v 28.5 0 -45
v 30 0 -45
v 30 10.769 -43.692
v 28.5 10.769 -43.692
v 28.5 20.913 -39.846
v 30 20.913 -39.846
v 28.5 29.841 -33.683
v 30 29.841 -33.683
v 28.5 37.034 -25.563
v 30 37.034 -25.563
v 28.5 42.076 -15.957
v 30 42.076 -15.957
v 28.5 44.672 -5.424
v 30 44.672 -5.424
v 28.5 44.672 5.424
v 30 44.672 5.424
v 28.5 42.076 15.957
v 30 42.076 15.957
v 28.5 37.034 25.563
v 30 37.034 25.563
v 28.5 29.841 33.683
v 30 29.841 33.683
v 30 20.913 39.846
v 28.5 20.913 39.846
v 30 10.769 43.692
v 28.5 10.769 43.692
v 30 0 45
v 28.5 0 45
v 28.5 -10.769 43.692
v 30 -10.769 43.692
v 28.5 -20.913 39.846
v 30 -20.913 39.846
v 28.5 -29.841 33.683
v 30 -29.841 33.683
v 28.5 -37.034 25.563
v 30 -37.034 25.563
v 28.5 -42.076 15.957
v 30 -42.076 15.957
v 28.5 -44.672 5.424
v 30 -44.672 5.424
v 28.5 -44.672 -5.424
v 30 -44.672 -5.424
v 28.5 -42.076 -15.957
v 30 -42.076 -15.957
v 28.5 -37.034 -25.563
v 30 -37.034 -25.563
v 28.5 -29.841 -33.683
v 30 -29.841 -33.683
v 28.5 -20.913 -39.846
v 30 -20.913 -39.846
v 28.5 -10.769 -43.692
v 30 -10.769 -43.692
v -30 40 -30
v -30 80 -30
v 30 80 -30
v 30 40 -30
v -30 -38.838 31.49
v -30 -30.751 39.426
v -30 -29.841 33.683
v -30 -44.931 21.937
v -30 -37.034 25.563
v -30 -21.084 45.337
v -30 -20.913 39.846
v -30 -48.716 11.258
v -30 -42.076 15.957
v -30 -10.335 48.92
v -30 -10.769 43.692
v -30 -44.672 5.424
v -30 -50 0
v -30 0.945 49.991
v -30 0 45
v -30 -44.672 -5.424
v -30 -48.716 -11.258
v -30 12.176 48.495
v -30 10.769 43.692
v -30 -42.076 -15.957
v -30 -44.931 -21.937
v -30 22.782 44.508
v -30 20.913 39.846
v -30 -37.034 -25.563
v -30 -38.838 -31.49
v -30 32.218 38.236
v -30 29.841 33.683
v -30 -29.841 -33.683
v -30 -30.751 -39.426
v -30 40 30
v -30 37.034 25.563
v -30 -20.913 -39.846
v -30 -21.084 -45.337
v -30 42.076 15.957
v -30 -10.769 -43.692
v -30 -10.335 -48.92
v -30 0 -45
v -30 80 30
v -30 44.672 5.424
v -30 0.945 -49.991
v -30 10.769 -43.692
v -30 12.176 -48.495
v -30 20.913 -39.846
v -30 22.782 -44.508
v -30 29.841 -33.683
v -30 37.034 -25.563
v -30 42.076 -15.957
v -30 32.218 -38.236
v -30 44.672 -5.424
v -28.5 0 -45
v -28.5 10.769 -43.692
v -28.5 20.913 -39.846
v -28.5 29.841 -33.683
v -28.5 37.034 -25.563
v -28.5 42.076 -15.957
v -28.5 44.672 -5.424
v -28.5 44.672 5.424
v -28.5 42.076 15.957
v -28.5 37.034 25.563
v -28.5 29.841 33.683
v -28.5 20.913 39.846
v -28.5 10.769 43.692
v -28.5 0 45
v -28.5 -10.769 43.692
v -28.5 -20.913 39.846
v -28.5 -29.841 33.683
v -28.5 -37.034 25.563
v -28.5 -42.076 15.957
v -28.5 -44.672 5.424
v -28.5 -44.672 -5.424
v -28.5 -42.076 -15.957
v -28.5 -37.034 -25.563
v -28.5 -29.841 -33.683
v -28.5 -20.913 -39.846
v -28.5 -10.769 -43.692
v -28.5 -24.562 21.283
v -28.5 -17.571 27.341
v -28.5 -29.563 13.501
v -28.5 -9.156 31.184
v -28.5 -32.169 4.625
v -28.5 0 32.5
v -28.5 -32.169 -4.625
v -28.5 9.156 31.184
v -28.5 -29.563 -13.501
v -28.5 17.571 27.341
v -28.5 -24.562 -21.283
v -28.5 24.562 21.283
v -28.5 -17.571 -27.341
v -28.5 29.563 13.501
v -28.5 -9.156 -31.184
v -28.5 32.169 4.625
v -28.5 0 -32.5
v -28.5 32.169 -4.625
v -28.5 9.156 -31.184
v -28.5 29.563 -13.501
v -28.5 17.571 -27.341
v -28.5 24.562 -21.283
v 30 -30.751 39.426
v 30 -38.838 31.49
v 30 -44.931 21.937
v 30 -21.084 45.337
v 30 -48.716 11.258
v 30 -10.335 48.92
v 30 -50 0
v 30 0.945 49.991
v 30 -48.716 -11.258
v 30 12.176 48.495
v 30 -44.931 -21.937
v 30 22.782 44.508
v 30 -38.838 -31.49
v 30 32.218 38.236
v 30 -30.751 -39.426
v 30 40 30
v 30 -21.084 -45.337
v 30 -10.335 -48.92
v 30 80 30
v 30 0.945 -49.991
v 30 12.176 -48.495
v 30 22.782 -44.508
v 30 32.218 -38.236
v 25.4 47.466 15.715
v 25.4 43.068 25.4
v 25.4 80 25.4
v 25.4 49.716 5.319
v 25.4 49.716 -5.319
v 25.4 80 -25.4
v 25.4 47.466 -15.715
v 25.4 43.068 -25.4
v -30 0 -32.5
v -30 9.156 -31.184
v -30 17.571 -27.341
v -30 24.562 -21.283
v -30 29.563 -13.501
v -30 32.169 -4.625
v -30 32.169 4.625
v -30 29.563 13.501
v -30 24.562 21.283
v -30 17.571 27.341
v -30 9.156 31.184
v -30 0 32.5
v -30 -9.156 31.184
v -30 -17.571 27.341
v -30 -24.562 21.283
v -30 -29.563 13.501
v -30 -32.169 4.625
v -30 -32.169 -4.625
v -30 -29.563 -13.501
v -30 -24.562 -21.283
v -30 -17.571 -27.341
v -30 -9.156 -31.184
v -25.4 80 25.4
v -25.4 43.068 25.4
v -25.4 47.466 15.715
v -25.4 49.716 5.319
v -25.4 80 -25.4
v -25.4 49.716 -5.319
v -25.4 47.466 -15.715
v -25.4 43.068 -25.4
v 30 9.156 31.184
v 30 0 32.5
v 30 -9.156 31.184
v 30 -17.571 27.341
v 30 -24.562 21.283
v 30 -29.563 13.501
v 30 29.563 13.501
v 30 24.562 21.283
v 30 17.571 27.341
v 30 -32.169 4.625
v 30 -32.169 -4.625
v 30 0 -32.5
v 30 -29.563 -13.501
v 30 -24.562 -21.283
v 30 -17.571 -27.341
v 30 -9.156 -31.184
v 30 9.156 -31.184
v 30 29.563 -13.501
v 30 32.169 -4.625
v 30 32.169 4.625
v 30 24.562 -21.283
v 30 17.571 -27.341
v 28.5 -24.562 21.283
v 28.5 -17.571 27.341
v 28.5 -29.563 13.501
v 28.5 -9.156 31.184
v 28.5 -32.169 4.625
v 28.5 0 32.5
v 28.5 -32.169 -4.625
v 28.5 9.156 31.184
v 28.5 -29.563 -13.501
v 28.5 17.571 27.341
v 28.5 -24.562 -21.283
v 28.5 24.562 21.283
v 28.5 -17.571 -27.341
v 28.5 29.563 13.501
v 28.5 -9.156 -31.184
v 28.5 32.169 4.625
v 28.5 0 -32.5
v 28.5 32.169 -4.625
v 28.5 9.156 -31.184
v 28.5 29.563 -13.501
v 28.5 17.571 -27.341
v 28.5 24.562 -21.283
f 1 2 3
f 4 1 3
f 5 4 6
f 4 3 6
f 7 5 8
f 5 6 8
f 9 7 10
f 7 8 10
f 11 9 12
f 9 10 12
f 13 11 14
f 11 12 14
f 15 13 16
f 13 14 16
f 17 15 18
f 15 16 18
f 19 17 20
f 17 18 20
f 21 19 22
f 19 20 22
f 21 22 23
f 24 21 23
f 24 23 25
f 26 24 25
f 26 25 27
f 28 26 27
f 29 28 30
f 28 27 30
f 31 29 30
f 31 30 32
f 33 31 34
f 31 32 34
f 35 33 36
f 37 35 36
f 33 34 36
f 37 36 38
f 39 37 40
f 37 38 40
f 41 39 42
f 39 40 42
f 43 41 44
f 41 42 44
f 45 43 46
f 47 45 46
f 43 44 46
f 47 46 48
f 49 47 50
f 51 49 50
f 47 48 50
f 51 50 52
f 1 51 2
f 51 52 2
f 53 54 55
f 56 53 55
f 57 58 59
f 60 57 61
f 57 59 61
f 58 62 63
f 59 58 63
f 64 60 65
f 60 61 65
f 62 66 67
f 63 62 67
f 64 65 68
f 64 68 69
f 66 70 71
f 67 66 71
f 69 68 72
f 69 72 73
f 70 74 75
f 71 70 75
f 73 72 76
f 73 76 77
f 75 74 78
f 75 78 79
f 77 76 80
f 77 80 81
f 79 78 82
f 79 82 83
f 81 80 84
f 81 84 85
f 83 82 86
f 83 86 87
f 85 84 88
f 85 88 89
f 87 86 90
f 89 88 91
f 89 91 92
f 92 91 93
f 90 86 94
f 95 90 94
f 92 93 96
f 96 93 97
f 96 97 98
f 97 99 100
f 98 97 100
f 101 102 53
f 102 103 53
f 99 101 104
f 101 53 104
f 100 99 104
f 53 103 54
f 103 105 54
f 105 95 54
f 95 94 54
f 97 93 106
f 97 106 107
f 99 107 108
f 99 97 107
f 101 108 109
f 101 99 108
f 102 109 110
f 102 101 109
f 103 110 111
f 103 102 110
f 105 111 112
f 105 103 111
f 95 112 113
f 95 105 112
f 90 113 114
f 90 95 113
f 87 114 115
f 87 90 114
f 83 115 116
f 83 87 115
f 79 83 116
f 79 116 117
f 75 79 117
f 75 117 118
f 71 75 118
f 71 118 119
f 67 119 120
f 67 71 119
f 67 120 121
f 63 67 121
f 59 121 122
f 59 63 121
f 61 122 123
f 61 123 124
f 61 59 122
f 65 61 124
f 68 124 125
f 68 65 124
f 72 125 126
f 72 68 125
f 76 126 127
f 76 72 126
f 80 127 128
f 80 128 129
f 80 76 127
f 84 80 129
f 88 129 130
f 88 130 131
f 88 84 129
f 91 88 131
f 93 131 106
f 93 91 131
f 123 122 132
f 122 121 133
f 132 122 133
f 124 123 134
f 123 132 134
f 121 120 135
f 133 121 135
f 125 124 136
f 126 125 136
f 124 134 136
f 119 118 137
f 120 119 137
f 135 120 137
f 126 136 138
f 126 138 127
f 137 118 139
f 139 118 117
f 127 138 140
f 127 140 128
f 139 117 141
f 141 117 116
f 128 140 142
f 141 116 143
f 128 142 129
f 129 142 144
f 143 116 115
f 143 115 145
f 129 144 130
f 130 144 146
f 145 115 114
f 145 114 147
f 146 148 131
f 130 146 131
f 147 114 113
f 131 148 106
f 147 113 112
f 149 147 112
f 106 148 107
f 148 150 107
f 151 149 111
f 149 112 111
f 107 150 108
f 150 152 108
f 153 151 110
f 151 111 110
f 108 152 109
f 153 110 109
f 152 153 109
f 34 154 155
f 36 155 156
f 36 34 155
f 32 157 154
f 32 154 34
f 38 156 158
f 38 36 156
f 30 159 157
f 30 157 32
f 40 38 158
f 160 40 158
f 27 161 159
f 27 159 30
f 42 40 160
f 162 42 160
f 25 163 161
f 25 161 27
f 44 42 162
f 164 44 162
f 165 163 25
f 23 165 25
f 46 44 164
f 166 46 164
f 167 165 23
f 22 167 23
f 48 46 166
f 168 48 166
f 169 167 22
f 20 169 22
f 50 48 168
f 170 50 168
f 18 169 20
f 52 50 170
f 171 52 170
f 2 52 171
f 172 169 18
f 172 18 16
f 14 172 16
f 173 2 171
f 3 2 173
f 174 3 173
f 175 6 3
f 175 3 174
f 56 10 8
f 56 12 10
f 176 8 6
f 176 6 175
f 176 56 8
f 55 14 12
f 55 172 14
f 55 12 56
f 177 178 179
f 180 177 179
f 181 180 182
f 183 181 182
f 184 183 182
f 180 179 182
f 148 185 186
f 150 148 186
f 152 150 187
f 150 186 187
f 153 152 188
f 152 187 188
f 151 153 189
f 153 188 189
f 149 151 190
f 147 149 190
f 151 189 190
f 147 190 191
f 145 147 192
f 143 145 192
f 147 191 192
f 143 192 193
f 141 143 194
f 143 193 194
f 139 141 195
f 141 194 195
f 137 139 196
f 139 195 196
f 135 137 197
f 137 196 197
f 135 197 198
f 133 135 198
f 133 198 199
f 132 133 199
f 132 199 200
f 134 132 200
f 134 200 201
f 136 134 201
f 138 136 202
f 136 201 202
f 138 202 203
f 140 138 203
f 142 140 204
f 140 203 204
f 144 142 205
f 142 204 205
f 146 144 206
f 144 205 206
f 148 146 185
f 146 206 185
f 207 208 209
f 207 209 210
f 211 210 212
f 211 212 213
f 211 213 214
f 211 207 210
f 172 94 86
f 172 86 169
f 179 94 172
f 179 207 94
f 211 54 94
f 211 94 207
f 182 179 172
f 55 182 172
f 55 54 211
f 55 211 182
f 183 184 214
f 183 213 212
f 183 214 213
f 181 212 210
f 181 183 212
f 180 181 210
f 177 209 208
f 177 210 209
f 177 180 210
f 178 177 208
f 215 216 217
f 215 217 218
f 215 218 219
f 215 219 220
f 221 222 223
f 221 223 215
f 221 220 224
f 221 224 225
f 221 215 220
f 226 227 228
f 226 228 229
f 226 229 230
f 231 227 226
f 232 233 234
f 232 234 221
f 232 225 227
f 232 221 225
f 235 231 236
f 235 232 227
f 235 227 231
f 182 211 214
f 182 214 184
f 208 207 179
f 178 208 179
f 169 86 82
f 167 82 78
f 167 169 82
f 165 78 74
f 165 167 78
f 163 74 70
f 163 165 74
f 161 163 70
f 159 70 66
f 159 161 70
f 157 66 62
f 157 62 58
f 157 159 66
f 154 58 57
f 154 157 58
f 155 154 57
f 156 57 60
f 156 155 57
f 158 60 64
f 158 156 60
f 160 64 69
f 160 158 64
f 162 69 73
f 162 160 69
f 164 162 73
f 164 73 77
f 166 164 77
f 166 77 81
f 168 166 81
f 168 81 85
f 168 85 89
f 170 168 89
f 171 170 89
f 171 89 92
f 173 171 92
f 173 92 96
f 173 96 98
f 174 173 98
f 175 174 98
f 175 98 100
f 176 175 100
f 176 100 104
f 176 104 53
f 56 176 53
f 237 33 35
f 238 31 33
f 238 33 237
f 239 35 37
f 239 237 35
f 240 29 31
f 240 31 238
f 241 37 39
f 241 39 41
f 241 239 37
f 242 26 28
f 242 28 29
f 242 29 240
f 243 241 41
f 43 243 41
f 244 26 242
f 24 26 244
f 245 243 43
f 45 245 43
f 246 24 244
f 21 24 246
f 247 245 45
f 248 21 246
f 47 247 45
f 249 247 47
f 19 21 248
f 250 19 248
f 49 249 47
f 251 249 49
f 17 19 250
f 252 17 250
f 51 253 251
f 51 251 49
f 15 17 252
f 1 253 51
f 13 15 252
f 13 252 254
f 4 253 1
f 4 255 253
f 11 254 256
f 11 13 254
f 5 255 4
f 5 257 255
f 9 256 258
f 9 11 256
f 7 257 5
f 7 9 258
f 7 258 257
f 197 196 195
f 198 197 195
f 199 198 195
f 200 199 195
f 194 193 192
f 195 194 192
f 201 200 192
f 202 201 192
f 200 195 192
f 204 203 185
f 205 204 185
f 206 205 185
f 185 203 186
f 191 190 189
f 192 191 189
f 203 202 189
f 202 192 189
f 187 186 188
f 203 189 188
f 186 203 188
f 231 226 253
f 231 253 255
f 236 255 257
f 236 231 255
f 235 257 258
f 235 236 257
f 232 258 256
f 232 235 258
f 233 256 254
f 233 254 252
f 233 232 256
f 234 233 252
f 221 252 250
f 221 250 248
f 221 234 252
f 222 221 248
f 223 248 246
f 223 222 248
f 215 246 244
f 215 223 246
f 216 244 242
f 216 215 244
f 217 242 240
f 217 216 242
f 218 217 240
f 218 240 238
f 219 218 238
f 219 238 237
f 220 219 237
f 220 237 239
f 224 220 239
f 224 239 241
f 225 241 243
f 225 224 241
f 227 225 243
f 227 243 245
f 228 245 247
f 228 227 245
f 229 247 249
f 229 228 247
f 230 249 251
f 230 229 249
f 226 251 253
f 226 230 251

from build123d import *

# Parameters (mm, degrees)
CROQUIS1_R                   = 50
SALIENTE_EXTRUIR1_DEPTH      = 30
SALIENTE_EXTRUIR2_REACH      = 144.478
SALIENTE_EXTRUIR2_END_RADIUS = 50
CROQUIS3_W                   = 60
CROQUIS3_H                   = 60
CROQUIS3_W_2                 = 50.8
CROQUIS3_H_2                 = 50.8
CROQUIS4_R                   = 45
CROQUIS4_R_2                 = 32.5
CORTAR_EXTRUIR1_DEPTH        = 1.5


with BuildPart() as part:
    # Croquis1 → Saliente-Extruir1 (new, symmetric)
    with BuildSketch(Plane(origin=(0, 0, 0), x_dir=(0, 0, -1), z_dir=(1, 0, 0))):
        Circle(CROQUIS1_R)
    extrude(amount=SALIENTE_EXTRUIR1_DEPTH, both=True)

    # Saliente-Extruir2: up to this cylinder (the profile starts outside it)
    saliente_extruir2_end = Plane(origin=(0, 0, 0), z_dir=(-1, 0, 0)) * Cylinder(SALIENTE_EXTRUIR2_END_RADIUS, 389.956, mode=Mode.PRIVATE)
    # Croquis3 → Saliente-Extruir2 (add, up to the surface)
    with BuildSketch(Plane(origin=(0, 80, 0), x_dir=(1, 0, 0), z_dir=(0, 1, 0)), mode=Mode.PRIVATE) as saliente_extruir2_sk1:
        Rectangle(CROQUIS3_W, CROQUIS3_H)
        Rectangle(CROQUIS3_W_2, CROQUIS3_H_2, mode=Mode.SUBTRACT)
    saliente_extruir2_tool1 = extrude(saliente_extruir2_sk1.sketch, amount=-SALIENTE_EXTRUIR2_REACH, mode=Mode.PRIVATE) - saliente_extruir2_end
    add(saliente_extruir2_tool1.solids().sort_by_distance((0, 80, 29.151472))[0])

    # Croquis4 → Cortar-Extruir1 (cut)
    with BuildSketch(Plane(origin=(30, 0, 0), x_dir=(0, 0, -1), z_dir=(1, 0, 0))):
        Circle(CROQUIS4_R)
        Circle(CROQUIS4_R_2, mode=Mode.SUBTRACT)
    cortar_extruir1 = extrude(amount=-CORTAR_EXTRUIR1_DEPTH, mode=Mode.SUBTRACT)

    # Simetría1: Cortar-Extruir1 across plane
    add(cortar_extruir1.mirror(Plane(origin=(0, 0, 0), x_dir=(0, 0, 1), z_dir=(1, 0, 0))), mode=Mode.SUBTRACT)


solid = part.part
